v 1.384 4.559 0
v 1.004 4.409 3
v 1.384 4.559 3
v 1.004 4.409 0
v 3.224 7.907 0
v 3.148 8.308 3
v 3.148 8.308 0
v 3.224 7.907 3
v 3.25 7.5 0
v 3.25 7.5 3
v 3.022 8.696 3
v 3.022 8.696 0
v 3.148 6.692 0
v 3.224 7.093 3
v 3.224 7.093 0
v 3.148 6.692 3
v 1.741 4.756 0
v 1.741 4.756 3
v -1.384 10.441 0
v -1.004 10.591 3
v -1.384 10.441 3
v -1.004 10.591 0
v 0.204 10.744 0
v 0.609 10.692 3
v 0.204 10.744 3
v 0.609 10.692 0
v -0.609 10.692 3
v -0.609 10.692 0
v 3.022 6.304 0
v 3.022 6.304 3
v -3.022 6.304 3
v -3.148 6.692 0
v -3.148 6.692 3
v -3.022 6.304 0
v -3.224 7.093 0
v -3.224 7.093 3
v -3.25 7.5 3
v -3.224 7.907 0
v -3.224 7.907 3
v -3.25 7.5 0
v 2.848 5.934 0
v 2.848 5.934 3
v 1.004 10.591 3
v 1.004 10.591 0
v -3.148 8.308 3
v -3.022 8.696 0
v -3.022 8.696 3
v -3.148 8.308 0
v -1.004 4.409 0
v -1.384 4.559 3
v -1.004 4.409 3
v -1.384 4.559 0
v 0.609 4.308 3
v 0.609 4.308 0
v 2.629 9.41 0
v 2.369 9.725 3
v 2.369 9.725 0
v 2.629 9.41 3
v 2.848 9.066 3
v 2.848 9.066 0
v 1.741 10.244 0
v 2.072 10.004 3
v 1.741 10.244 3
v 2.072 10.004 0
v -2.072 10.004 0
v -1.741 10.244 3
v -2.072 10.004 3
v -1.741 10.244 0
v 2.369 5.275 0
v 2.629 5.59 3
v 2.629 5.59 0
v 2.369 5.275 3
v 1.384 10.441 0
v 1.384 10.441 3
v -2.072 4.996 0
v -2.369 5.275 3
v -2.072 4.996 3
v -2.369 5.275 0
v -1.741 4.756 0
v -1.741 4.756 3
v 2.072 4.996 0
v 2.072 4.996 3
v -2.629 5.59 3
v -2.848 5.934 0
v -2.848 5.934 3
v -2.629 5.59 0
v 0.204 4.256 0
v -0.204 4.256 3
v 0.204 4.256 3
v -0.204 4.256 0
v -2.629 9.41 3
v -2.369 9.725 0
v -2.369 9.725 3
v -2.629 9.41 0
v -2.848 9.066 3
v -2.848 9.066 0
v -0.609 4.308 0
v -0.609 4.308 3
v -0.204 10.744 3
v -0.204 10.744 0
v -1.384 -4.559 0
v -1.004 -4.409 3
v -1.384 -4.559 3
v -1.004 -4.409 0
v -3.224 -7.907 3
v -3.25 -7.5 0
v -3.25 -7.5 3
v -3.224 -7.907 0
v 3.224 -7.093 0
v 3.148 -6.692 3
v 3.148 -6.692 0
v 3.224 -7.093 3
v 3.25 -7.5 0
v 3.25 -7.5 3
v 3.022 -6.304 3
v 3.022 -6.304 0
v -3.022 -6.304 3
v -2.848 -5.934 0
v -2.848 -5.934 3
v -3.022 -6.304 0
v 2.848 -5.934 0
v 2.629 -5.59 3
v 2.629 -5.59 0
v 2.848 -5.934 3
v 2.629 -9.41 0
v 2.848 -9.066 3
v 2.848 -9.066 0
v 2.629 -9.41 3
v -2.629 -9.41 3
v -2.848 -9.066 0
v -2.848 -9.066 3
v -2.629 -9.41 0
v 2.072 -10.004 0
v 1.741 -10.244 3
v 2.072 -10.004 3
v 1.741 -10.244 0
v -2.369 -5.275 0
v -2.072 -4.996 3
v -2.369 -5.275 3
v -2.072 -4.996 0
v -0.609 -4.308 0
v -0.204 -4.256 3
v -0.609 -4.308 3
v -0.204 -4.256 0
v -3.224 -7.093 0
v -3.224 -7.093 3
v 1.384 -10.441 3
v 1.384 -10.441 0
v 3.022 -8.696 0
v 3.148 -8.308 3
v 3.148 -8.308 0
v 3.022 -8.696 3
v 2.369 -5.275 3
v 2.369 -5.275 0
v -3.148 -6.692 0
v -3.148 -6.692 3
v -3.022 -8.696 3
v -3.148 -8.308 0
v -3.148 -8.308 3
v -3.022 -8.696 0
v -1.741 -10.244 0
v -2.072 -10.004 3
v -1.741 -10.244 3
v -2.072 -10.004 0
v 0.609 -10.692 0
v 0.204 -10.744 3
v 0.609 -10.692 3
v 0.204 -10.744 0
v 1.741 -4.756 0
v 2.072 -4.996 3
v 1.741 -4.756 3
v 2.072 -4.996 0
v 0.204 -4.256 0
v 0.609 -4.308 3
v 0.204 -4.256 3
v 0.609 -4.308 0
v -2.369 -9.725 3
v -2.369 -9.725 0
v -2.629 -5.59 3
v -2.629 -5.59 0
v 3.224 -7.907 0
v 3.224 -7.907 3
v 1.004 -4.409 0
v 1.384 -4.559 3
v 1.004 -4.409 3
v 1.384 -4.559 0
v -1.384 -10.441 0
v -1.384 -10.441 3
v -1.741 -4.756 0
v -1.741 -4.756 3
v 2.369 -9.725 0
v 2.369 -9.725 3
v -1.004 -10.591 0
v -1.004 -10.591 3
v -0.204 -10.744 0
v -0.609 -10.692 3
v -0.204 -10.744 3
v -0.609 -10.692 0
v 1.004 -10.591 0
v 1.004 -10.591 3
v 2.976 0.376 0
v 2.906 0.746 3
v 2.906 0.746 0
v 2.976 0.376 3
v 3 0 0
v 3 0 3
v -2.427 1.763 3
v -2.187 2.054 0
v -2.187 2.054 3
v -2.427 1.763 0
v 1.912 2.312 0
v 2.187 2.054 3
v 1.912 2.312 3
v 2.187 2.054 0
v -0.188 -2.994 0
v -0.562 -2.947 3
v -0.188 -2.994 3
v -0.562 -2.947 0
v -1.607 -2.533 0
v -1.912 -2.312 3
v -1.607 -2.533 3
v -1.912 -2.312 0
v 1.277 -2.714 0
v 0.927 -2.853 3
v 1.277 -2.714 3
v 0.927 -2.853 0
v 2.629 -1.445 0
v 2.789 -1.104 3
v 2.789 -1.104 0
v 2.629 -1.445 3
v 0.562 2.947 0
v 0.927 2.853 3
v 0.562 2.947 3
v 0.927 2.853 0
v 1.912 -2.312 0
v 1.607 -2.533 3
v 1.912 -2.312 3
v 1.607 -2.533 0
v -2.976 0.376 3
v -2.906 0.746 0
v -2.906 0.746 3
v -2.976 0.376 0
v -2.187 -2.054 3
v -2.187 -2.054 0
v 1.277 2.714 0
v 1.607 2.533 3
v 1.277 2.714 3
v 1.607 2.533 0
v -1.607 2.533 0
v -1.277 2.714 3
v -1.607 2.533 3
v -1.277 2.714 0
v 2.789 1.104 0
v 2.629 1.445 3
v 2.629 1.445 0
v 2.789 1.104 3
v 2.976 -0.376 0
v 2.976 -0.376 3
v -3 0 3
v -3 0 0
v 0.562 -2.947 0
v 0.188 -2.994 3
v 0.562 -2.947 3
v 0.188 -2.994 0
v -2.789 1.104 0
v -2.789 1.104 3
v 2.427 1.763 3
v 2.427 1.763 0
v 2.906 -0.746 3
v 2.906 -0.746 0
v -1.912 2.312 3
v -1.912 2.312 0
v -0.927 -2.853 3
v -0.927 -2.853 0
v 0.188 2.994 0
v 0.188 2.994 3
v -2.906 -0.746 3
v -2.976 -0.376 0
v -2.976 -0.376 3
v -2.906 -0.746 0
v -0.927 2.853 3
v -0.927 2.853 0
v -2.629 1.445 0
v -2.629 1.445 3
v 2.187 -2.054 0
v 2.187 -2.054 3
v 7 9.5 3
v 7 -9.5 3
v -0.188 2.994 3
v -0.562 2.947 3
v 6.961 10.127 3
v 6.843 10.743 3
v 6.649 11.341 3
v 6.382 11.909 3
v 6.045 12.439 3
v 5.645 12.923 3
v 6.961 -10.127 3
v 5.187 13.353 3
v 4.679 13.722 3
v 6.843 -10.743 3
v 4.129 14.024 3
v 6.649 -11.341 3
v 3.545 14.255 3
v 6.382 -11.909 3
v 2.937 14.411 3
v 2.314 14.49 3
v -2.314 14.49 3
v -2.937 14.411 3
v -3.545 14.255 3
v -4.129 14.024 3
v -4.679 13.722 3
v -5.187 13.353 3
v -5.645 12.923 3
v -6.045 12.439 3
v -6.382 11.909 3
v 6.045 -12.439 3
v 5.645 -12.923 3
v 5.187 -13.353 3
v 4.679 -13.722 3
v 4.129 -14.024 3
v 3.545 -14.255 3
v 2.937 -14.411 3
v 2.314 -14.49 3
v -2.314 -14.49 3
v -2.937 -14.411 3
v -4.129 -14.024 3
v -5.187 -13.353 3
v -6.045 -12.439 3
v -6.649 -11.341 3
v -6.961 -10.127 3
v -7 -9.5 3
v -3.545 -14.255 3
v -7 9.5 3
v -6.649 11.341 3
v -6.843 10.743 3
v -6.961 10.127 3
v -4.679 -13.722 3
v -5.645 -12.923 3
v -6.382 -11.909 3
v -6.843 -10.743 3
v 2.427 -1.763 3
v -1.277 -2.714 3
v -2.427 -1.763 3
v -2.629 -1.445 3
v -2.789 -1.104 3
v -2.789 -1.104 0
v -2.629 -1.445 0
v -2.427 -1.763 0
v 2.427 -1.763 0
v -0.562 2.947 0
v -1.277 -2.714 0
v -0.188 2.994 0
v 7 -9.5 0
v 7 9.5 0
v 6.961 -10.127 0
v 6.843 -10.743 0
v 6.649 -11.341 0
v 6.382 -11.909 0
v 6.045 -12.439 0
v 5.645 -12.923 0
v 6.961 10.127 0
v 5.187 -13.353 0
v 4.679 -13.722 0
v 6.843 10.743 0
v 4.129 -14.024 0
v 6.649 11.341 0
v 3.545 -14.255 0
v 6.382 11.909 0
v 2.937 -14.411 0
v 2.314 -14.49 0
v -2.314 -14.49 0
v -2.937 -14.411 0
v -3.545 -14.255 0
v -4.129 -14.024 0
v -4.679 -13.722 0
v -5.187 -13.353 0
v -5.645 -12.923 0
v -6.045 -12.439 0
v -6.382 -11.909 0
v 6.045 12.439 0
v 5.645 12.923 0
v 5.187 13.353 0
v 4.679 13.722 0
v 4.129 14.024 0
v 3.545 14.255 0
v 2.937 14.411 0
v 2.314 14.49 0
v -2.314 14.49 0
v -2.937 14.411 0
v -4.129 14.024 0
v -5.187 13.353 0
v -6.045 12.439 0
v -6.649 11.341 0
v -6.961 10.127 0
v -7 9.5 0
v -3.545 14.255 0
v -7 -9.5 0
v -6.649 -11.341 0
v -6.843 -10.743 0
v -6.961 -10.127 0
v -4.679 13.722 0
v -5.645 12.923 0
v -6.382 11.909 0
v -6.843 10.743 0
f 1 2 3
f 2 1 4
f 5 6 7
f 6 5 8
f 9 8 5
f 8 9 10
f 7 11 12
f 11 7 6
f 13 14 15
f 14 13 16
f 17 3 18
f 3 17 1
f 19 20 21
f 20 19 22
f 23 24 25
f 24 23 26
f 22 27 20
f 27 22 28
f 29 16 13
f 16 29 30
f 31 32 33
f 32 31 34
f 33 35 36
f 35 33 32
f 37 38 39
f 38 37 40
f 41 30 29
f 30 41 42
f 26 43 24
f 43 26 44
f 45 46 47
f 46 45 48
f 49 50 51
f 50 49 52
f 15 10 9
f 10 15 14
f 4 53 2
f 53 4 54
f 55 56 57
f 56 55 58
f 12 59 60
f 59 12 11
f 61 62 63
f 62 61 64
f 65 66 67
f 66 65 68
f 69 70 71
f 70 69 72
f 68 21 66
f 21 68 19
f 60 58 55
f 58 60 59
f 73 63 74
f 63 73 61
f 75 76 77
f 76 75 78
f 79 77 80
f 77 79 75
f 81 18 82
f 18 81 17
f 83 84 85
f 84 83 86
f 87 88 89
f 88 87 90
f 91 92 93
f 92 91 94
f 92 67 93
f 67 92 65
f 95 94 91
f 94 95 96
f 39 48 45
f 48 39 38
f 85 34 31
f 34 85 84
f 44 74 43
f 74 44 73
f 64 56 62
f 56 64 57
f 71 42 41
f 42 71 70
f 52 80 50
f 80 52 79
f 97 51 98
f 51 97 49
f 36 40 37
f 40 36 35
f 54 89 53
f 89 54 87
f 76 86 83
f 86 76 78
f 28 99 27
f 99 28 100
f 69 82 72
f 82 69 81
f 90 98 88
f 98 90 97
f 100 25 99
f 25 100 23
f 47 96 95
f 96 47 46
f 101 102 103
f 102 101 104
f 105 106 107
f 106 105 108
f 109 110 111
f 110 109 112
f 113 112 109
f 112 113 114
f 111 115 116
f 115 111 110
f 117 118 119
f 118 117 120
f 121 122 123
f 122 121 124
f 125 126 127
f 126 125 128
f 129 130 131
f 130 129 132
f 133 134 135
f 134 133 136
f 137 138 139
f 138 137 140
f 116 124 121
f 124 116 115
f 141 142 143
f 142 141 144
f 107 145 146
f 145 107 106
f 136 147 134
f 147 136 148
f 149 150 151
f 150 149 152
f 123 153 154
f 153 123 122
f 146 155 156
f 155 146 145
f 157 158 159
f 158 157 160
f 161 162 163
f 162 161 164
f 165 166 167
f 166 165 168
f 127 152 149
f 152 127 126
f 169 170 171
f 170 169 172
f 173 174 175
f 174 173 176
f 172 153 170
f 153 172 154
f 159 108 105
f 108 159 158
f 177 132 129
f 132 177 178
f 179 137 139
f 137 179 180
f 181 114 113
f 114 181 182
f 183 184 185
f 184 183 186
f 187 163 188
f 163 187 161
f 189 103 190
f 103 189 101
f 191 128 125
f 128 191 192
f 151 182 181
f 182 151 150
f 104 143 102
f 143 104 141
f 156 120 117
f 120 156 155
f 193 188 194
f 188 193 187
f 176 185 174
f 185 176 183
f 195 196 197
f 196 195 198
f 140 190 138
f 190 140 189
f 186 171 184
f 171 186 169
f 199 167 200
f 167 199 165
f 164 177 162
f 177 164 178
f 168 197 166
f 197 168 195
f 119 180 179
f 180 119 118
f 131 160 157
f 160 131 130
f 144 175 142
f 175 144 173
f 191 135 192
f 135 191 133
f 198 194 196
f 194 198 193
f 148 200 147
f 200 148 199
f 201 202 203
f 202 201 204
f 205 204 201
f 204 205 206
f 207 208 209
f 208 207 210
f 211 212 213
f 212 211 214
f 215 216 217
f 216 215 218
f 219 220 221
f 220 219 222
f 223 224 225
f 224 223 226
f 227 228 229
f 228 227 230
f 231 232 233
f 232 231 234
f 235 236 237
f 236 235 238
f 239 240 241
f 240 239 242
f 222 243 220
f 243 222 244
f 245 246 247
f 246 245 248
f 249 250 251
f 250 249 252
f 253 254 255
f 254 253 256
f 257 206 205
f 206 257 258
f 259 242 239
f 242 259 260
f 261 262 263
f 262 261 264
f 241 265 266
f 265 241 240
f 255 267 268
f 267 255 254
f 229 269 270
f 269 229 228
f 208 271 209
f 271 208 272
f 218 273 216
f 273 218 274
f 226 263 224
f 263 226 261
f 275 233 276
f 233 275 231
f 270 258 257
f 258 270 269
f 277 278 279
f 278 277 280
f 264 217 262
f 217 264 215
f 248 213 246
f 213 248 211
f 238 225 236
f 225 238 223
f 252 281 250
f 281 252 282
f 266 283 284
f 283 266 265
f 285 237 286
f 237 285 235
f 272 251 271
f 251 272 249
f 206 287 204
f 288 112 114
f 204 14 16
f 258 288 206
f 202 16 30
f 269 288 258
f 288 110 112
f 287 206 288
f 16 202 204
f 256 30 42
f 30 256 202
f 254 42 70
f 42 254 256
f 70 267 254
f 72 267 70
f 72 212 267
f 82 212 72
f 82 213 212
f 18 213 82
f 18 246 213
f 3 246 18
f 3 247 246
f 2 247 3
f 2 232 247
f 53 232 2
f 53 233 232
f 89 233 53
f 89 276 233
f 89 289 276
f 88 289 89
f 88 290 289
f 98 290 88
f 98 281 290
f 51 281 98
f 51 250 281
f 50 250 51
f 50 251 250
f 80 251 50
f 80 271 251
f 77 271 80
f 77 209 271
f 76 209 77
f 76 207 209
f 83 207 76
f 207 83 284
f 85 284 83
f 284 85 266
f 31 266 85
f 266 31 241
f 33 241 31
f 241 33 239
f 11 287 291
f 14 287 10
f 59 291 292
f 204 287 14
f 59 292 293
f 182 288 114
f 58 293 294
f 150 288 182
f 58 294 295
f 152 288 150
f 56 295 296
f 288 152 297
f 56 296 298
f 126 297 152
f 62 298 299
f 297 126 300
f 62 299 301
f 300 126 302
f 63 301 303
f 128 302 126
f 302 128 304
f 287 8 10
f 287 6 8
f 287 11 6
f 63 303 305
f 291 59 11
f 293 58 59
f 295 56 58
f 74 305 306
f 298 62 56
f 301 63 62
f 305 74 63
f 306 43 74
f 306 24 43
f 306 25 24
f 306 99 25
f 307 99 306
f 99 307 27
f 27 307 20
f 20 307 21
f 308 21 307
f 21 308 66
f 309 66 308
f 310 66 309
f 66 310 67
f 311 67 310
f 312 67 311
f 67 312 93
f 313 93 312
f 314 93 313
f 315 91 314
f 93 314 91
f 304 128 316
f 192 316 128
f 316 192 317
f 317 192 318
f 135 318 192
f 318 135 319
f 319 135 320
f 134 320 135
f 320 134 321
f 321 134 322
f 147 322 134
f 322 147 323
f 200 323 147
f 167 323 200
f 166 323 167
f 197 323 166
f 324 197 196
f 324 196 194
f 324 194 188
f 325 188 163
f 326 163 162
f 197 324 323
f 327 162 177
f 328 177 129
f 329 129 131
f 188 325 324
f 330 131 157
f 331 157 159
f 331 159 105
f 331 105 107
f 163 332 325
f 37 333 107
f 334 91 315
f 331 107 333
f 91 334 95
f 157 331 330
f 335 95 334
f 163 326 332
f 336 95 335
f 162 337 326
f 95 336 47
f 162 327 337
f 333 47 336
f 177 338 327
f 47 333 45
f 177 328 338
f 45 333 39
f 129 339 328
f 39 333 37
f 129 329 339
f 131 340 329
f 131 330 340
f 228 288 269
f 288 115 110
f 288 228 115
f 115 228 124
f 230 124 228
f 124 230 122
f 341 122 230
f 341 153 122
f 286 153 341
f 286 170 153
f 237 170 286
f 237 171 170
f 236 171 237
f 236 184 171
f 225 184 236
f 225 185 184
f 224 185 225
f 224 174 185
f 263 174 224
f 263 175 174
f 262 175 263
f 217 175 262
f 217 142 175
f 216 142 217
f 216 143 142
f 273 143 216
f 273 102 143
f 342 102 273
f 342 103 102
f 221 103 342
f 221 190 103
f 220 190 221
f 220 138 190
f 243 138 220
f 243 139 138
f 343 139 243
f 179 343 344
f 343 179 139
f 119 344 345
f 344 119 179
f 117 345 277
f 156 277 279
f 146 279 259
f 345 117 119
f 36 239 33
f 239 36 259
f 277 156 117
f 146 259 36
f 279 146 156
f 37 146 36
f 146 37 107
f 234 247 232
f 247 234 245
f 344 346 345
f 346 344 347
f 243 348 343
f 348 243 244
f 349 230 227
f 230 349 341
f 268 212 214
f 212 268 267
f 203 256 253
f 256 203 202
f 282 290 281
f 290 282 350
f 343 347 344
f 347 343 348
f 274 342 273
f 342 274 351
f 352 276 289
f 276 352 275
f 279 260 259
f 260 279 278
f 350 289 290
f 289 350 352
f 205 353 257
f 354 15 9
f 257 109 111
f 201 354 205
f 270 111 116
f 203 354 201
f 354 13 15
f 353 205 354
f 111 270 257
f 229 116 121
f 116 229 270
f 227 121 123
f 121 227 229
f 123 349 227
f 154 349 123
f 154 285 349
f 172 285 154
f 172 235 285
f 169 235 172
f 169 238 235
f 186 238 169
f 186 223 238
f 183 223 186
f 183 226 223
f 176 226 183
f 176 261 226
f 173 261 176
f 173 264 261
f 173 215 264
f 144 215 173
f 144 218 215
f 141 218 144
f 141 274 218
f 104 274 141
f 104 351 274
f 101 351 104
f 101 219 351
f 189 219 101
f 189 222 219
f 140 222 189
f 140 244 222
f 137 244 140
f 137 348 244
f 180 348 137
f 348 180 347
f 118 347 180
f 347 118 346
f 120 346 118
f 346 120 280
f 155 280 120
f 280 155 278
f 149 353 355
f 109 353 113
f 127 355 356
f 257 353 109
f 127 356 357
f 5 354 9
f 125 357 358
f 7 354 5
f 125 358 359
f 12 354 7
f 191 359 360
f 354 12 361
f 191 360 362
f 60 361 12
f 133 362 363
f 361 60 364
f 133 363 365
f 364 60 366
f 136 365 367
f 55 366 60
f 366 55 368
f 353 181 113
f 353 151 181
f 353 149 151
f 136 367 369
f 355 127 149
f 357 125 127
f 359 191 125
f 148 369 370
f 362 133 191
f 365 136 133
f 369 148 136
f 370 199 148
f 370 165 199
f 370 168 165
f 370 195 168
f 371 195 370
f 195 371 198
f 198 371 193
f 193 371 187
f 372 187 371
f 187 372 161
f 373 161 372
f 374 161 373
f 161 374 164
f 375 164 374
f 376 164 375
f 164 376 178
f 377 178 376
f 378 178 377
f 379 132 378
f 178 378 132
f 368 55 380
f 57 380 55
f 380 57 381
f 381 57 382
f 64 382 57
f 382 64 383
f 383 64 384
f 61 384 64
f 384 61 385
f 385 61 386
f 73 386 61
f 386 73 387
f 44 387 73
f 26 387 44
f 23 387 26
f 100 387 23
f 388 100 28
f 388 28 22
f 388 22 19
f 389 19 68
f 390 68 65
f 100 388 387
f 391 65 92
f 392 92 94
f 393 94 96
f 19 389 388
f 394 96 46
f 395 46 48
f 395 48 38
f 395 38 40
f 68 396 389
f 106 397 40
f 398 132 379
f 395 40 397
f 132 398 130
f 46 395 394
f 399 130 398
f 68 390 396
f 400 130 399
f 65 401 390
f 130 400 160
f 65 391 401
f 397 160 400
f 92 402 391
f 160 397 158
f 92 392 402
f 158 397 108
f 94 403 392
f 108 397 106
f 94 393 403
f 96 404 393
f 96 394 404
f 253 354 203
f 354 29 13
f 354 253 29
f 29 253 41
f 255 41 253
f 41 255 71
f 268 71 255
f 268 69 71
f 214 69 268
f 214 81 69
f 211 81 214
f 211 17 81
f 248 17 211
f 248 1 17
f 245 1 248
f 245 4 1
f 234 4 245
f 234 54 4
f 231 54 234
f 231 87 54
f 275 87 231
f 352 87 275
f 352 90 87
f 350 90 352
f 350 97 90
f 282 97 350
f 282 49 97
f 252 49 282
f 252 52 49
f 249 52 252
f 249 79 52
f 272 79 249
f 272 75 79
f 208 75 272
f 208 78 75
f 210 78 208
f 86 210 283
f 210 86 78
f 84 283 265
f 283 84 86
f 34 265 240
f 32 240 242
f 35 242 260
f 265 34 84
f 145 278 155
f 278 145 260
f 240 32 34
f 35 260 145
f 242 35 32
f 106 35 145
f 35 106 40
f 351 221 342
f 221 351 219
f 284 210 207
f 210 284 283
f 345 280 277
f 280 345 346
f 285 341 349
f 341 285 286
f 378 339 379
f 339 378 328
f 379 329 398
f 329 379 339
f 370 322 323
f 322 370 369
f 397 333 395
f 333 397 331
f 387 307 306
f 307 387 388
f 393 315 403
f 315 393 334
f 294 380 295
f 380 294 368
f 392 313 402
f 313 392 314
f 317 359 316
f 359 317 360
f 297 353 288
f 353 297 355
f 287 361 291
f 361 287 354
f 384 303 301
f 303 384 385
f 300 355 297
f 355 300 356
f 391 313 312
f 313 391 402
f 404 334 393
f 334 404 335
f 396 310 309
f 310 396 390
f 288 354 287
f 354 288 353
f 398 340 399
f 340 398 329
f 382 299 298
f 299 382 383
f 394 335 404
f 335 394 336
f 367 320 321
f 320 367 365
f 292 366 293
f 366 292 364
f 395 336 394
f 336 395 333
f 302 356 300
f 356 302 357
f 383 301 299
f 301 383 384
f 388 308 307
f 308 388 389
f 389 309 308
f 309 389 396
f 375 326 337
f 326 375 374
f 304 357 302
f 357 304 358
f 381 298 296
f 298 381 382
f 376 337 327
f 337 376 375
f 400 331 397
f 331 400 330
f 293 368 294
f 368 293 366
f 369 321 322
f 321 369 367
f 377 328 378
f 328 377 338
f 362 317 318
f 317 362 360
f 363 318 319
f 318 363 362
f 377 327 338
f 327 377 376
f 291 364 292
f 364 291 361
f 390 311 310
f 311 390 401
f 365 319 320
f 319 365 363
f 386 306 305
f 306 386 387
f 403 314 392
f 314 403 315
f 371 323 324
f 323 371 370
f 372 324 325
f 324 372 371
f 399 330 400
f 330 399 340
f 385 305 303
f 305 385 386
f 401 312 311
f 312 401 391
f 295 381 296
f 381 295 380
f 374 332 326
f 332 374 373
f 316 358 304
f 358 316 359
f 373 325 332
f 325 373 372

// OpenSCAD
$fn = 50;


difference() {
	union() {
		hull() {
			translate(v = [-2.0000000000, 9.5000000000, 0]) {
				cylinder(h = 3, r = 5);
			}
			translate(v = [2.0000000000, 9.5000000000, 0]) {
				cylinder(h = 3, r = 5);
			}
			translate(v = [-2.0000000000, -9.5000000000, 0]) {
				cylinder(h = 3, r = 5);
			}
			translate(v = [2.0000000000, -9.5000000000, 0]) {
				cylinder(h = 3, r = 5);
			}
		}
	}
	union() {
		#translate(v = [0.0000000000, 7.5000000000, 0]) {
			cylinder(h = 3, r = 3.2500000000);
		}
		#translate(v = [0.0000000000, -7.5000000000, 0]) {
			cylinder(h = 3, r = 3.2500000000);
		}
		#translate(v = [0.0000000000, -7.5000000000, -100.0000000000]) {
			cylinder(h = 200, r = 3.2500000000);
		}
		#translate(v = [0.0000000000, -7.5000000000, -100.0000000000]) {
			cylinder(h = 200, r = 3.2500000000);
		}
		#translate(v = [0.0000000000, 7.5000000000, -100.0000000000]) {
			cylinder(h = 200, r = 3.2500000000);
		}
		#translate(v = [0.0000000000, 7.5000000000, -100.0000000000]) {
			cylinder(h = 200, r = 3.2500000000);
		}
		#translate(v = [0.0000000000, 7.5000000000, 0]) {
			cylinder(h = 3, r = 1.8000000000);
		}
		#translate(v = [0.0000000000, -7.5000000000, 0]) {
			cylinder(h = 3, r = 1.8000000000);
		}
		#translate(v = [0.0000000000, 7.5000000000, 0]) {
			cylinder(h = 3, r = 1.8000000000);
		}
		#translate(v = [0.0000000000, -7.5000000000, 0]) {
			cylinder(h = 3, r = 1.8000000000);
		}
		#translate(v = [0.0000000000, 7.5000000000, 0]) {
			cylinder(h = 3, r = 1.8000000000);
		}
		#translate(v = [0.0000000000, -7.5000000000, 0]) {
			cylinder(h = 3, r = 1.8000000000);
		}
		#cylinder(h = 3, r = 3.0000000000);
	}
}
